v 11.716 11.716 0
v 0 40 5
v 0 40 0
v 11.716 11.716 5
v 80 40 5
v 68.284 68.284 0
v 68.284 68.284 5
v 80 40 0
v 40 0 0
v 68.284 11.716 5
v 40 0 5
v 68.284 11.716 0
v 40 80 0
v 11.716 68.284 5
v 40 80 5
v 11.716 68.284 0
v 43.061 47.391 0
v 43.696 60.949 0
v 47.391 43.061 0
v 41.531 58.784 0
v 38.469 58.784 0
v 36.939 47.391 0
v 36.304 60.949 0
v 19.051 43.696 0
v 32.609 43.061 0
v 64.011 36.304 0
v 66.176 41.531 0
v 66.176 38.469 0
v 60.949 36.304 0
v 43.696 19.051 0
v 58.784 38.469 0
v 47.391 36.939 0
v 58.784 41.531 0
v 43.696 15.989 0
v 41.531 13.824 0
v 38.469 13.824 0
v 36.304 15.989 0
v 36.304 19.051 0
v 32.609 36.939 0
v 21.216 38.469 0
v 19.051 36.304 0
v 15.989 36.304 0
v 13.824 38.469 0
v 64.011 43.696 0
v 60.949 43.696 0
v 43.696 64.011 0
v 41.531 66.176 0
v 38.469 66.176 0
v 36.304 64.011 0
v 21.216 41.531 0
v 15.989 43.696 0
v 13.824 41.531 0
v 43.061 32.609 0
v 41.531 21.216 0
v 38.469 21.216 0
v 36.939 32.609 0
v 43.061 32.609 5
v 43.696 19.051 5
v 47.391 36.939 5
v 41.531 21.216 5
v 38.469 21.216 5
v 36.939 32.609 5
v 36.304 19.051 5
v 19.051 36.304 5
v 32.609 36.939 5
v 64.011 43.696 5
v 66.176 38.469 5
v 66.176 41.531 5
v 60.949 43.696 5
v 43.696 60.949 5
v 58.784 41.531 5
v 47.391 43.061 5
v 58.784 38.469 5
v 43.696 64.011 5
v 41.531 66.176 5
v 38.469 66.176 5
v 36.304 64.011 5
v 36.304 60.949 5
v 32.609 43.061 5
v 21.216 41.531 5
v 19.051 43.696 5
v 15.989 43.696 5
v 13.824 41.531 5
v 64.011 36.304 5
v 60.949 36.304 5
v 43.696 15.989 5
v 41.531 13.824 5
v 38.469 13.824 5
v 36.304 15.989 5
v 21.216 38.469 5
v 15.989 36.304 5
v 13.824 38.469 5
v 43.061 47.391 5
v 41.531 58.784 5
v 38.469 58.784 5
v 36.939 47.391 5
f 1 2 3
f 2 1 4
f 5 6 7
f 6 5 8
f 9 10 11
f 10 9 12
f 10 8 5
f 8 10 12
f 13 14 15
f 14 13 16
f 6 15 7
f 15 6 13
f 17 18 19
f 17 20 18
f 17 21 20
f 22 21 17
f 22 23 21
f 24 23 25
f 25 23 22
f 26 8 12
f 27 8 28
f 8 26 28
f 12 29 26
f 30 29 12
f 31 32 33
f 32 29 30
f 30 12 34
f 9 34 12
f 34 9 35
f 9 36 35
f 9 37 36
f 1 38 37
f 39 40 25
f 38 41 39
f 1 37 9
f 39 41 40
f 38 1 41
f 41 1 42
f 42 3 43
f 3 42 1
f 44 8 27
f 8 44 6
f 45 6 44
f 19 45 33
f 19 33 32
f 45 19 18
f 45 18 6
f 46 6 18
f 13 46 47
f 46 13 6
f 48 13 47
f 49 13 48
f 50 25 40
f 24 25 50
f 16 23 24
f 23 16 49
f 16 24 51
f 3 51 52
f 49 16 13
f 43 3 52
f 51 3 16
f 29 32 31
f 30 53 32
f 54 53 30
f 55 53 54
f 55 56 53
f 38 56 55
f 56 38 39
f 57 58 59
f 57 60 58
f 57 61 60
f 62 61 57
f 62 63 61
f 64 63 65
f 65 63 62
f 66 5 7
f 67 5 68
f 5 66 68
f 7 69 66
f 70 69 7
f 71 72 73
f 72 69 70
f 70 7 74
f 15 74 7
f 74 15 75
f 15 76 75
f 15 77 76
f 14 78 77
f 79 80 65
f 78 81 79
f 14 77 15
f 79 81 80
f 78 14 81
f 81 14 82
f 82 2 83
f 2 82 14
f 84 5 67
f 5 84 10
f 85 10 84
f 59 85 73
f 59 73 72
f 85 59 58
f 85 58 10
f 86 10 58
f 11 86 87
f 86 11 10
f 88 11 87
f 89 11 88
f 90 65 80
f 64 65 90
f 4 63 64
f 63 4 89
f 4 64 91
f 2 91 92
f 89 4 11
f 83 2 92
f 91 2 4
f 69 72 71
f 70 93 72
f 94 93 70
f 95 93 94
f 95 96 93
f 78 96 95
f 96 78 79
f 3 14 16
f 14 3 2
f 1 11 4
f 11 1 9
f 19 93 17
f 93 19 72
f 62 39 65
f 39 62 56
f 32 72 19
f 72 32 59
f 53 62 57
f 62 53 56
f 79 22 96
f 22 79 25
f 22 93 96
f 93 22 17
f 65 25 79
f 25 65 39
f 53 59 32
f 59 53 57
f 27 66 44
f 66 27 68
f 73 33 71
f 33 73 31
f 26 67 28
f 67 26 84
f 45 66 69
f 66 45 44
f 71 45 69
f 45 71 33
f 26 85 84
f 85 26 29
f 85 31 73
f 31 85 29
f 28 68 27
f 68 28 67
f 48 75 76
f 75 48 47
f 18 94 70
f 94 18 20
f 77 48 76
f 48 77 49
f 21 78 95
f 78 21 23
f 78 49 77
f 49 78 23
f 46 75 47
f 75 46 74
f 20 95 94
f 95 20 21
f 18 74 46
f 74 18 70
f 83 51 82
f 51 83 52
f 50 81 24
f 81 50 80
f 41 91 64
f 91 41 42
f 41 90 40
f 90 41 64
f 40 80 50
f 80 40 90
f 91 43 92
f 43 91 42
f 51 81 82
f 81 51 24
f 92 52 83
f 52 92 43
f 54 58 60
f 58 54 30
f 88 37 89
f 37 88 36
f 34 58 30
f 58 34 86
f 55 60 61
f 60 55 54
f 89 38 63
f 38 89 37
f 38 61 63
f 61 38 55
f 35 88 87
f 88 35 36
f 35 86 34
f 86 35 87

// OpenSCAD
$fn = 32;

// ----------------------------------------------------------------------
// Polygon plate: 8-gon R40, 4 bolt windows
// ----------------------------------------------------------------------

// --- parameters (mm) ---
sides = 8;                // number of polygon sides
plate_r = 40;             // circumscribed radius of the polygon
bore_r = 8;               // centre bore radius
bolts = 4;                // number of bolt windows
ring_r = 22.48;           // bolt-circle radius
bolt_r = 4;               // bolt window radius
plate_t = 5;              // plate thickness, Z (extrusion height)

plate_d = 2 * plate_r;  // circumscribed diameter
bore_d = 2 * bore_r;  // centre bore diameter
bolt_d = 2 * bolt_r;  // bolt window diameter
ring_d = 2 * ring_r;  // bolt-circle diameter

profile = [[80, 40], [68.284, 68.284], [40, 80], [11.716, 68.284], [0, 40], [11.716, 11.716], [40, 0], [68.284, 11.716]];  // primary outline, 8 points, counter clockwise
void_1 = [[47.391, 43.061], [43.061, 47.391], [36.939, 47.391], [32.609, 43.061], [32.609, 36.939], [36.939, 32.609], [43.061, 32.609], [47.391, 36.939]];  // centre bore, 8 points
void_2 = [[66.176, 41.531], [64.011, 43.696], [60.949, 43.696], [58.784, 41.531], [58.784, 38.469], [60.949, 36.304], [64.011, 36.304], [66.176, 38.469]];  // bolt window 1, 8 points
void_3 = [[43.696, 64.011], [41.531, 66.176], [38.469, 66.176], [36.304, 64.011], [36.304, 60.949], [38.469, 58.784], [41.531, 58.784], [43.696, 60.949]];  // bolt window 2, 8 points
void_4 = [[21.216, 41.531], [19.051, 43.696], [15.989, 43.696], [13.824, 41.531], [13.824, 38.469], [15.989, 36.304], [19.051, 36.304], [21.216, 38.469]];  // bolt window 3, 8 points
void_5 = [[43.696, 19.051], [41.531, 21.216], [38.469, 21.216], [36.304, 19.051], [36.304, 15.989], [38.469, 13.824], [41.531, 13.824], [43.696, 15.989]];  // bolt window 4, 8 points

// --- the one profile operation ---
difference() {
  linear_extrude(height = plate_t) polygon(points = profile);
  translate([0, 0, -1])
    linear_extrude(height = plate_t + 2) polygon(points = void_1);
  translate([0, 0, -1])
    linear_extrude(height = plate_t + 2) polygon(points = void_2);
  translate([0, 0, -1])
    linear_extrude(height = plate_t + 2) polygon(points = void_3);
  translate([0, 0, -1])
    linear_extrude(height = plate_t + 2) polygon(points = void_4);
  translate([0, 0, -1])
    linear_extrude(height = plate_t + 2) polygon(points = void_5);
}
